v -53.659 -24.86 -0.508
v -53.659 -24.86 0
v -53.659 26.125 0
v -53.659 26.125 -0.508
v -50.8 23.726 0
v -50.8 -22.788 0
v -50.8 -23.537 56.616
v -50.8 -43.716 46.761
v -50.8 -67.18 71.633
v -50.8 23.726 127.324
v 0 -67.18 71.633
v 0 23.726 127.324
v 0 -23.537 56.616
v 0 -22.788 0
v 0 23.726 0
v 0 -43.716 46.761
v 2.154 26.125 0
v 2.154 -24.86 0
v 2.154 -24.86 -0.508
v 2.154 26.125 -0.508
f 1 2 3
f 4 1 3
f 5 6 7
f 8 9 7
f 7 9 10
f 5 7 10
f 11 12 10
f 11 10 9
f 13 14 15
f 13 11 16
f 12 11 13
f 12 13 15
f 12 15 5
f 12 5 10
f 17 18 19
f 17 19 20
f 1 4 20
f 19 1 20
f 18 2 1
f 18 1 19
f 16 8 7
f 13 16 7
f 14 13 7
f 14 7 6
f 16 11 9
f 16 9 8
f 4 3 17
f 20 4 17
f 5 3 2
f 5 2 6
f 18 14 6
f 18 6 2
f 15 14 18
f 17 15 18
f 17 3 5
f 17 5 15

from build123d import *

# Parameters (mm, degrees)
F1_DEPTH = 50.8
F2_W     = 55.813026
F2_H     = 50.985549
F3_DEPTH = 0.508


with BuildPart() as f1:
    # F0 (on Right) → F1 (new body)
    with BuildSketch(Plane.YZ):
        Polygon((-23.537235, 56.615818), (-22.788359, 0), (23.725847, 0), (23.725847, 127.323955), (-67.180149, 71.632735), (-43.716218, 46.760969), align=None)
    extrude(amount=-F1_DEPTH)

    # F2 (on Top) → F3 (join)
    with BuildSketch(Plane.XY):
        with Locations((-25.752099, 0.632371)):
            Rectangle(F2_W, F2_H)
    extrude(amount=-F3_DEPTH)


solid = f1.part
